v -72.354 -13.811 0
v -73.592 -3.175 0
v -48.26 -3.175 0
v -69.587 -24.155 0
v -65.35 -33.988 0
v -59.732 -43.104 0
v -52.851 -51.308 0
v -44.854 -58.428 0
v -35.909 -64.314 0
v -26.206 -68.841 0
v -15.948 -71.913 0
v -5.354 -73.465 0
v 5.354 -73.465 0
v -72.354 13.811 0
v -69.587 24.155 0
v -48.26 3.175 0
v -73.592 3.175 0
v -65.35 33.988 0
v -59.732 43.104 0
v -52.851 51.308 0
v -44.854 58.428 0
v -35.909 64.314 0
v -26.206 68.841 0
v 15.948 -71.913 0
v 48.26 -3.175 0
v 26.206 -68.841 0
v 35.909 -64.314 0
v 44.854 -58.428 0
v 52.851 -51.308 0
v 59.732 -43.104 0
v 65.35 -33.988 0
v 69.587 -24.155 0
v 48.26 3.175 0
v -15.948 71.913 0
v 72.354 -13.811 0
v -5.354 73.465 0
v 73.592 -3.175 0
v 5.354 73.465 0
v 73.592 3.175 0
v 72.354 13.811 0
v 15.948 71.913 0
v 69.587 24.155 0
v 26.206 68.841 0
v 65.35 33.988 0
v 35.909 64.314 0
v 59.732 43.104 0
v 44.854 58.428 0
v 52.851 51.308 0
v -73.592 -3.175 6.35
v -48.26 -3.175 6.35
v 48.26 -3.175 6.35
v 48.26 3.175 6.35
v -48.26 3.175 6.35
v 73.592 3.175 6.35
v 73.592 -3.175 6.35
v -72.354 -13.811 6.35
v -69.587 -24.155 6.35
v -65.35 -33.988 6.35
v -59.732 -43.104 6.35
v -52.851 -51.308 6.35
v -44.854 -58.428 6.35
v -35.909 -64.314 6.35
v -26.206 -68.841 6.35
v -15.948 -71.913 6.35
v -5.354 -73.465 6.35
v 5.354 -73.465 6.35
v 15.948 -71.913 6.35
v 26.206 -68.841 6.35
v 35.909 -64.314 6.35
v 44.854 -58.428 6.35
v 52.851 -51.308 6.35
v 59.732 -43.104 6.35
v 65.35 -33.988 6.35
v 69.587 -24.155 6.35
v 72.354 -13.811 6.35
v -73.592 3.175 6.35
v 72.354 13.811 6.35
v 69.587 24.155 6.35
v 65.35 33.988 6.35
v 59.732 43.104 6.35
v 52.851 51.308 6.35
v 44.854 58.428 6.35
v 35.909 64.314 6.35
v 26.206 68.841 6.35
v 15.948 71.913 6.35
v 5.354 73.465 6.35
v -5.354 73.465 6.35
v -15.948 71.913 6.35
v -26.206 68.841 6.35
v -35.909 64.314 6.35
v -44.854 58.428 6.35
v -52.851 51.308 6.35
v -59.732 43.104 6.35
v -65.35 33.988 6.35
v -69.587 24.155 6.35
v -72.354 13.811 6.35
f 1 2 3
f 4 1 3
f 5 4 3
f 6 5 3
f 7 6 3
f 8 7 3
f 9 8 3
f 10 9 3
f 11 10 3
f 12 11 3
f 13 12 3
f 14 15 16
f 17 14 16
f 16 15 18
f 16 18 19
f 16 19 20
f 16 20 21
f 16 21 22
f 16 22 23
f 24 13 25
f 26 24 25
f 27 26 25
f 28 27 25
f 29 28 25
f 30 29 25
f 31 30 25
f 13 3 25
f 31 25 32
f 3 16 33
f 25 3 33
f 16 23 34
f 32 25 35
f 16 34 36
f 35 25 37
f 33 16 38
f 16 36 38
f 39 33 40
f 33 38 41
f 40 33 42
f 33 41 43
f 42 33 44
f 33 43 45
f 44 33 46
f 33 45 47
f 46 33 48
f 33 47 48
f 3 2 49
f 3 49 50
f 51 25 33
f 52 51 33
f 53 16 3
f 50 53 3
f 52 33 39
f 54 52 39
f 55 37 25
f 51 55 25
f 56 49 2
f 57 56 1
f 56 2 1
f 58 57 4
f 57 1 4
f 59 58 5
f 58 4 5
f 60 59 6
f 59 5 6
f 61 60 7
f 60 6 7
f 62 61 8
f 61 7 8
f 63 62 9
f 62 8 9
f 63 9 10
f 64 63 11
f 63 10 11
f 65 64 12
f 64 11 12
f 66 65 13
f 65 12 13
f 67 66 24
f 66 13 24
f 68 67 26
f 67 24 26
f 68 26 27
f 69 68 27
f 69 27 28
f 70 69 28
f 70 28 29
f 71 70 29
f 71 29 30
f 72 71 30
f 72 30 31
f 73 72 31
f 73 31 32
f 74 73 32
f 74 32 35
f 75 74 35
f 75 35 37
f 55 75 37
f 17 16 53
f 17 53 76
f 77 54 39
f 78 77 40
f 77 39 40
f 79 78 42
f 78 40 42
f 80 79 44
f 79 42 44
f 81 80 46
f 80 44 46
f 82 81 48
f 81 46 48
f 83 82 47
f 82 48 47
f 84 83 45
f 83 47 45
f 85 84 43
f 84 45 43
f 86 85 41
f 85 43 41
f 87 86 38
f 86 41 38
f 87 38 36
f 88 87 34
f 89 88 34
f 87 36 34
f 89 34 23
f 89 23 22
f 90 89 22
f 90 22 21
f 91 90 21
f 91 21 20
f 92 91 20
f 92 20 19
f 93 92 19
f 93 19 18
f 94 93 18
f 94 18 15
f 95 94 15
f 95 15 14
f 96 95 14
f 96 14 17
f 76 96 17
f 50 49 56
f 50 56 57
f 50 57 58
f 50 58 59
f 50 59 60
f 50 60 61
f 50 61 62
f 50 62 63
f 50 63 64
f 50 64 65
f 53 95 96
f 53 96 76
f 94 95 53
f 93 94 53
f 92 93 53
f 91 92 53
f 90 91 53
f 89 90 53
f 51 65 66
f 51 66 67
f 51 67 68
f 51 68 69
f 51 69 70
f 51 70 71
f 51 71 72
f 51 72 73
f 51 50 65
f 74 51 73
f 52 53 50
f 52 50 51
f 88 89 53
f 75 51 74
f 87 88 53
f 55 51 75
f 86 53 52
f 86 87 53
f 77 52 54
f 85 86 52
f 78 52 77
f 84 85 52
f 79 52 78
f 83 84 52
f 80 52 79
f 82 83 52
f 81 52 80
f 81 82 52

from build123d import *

# Parameters (mm, degrees)
SKETCH1_R           = 73.66
BOSS_EXTRUDE1_DEPTH = 6.35
CUT_EXTRUDE1_DEPTH  = 7.35


with BuildPart() as part:
    # Sketch1 → Boss-Extrude1 (new body)
    with BuildSketch(Plane.XY):
        Circle(SKETCH1_R)
    extrude(amount=BOSS_EXTRUDE1_DEPTH)

    # Sketch2 → Cut-Extrude1 (cut, through all)
    with BuildSketch(Plane(origin=(0, 0, 0), x_dir=(-1, 0, 0), z_dir=(0, 0, -1))):
        Polygon((-48.26, 0), (-48.26, 3.175), (-76.2, 3.175), (-76.2, -3.175), (-48.26, -3.175), align=None)
        Polygon((48.26, -3.175), (48.26, 0), (48.26, 3.175), (76.2, 3.175), (76.2, -3.175), align=None)
    extrude(amount=-CUT_EXTRUDE1_DEPTH, mode=Mode.SUBTRACT)


solid = part.part
